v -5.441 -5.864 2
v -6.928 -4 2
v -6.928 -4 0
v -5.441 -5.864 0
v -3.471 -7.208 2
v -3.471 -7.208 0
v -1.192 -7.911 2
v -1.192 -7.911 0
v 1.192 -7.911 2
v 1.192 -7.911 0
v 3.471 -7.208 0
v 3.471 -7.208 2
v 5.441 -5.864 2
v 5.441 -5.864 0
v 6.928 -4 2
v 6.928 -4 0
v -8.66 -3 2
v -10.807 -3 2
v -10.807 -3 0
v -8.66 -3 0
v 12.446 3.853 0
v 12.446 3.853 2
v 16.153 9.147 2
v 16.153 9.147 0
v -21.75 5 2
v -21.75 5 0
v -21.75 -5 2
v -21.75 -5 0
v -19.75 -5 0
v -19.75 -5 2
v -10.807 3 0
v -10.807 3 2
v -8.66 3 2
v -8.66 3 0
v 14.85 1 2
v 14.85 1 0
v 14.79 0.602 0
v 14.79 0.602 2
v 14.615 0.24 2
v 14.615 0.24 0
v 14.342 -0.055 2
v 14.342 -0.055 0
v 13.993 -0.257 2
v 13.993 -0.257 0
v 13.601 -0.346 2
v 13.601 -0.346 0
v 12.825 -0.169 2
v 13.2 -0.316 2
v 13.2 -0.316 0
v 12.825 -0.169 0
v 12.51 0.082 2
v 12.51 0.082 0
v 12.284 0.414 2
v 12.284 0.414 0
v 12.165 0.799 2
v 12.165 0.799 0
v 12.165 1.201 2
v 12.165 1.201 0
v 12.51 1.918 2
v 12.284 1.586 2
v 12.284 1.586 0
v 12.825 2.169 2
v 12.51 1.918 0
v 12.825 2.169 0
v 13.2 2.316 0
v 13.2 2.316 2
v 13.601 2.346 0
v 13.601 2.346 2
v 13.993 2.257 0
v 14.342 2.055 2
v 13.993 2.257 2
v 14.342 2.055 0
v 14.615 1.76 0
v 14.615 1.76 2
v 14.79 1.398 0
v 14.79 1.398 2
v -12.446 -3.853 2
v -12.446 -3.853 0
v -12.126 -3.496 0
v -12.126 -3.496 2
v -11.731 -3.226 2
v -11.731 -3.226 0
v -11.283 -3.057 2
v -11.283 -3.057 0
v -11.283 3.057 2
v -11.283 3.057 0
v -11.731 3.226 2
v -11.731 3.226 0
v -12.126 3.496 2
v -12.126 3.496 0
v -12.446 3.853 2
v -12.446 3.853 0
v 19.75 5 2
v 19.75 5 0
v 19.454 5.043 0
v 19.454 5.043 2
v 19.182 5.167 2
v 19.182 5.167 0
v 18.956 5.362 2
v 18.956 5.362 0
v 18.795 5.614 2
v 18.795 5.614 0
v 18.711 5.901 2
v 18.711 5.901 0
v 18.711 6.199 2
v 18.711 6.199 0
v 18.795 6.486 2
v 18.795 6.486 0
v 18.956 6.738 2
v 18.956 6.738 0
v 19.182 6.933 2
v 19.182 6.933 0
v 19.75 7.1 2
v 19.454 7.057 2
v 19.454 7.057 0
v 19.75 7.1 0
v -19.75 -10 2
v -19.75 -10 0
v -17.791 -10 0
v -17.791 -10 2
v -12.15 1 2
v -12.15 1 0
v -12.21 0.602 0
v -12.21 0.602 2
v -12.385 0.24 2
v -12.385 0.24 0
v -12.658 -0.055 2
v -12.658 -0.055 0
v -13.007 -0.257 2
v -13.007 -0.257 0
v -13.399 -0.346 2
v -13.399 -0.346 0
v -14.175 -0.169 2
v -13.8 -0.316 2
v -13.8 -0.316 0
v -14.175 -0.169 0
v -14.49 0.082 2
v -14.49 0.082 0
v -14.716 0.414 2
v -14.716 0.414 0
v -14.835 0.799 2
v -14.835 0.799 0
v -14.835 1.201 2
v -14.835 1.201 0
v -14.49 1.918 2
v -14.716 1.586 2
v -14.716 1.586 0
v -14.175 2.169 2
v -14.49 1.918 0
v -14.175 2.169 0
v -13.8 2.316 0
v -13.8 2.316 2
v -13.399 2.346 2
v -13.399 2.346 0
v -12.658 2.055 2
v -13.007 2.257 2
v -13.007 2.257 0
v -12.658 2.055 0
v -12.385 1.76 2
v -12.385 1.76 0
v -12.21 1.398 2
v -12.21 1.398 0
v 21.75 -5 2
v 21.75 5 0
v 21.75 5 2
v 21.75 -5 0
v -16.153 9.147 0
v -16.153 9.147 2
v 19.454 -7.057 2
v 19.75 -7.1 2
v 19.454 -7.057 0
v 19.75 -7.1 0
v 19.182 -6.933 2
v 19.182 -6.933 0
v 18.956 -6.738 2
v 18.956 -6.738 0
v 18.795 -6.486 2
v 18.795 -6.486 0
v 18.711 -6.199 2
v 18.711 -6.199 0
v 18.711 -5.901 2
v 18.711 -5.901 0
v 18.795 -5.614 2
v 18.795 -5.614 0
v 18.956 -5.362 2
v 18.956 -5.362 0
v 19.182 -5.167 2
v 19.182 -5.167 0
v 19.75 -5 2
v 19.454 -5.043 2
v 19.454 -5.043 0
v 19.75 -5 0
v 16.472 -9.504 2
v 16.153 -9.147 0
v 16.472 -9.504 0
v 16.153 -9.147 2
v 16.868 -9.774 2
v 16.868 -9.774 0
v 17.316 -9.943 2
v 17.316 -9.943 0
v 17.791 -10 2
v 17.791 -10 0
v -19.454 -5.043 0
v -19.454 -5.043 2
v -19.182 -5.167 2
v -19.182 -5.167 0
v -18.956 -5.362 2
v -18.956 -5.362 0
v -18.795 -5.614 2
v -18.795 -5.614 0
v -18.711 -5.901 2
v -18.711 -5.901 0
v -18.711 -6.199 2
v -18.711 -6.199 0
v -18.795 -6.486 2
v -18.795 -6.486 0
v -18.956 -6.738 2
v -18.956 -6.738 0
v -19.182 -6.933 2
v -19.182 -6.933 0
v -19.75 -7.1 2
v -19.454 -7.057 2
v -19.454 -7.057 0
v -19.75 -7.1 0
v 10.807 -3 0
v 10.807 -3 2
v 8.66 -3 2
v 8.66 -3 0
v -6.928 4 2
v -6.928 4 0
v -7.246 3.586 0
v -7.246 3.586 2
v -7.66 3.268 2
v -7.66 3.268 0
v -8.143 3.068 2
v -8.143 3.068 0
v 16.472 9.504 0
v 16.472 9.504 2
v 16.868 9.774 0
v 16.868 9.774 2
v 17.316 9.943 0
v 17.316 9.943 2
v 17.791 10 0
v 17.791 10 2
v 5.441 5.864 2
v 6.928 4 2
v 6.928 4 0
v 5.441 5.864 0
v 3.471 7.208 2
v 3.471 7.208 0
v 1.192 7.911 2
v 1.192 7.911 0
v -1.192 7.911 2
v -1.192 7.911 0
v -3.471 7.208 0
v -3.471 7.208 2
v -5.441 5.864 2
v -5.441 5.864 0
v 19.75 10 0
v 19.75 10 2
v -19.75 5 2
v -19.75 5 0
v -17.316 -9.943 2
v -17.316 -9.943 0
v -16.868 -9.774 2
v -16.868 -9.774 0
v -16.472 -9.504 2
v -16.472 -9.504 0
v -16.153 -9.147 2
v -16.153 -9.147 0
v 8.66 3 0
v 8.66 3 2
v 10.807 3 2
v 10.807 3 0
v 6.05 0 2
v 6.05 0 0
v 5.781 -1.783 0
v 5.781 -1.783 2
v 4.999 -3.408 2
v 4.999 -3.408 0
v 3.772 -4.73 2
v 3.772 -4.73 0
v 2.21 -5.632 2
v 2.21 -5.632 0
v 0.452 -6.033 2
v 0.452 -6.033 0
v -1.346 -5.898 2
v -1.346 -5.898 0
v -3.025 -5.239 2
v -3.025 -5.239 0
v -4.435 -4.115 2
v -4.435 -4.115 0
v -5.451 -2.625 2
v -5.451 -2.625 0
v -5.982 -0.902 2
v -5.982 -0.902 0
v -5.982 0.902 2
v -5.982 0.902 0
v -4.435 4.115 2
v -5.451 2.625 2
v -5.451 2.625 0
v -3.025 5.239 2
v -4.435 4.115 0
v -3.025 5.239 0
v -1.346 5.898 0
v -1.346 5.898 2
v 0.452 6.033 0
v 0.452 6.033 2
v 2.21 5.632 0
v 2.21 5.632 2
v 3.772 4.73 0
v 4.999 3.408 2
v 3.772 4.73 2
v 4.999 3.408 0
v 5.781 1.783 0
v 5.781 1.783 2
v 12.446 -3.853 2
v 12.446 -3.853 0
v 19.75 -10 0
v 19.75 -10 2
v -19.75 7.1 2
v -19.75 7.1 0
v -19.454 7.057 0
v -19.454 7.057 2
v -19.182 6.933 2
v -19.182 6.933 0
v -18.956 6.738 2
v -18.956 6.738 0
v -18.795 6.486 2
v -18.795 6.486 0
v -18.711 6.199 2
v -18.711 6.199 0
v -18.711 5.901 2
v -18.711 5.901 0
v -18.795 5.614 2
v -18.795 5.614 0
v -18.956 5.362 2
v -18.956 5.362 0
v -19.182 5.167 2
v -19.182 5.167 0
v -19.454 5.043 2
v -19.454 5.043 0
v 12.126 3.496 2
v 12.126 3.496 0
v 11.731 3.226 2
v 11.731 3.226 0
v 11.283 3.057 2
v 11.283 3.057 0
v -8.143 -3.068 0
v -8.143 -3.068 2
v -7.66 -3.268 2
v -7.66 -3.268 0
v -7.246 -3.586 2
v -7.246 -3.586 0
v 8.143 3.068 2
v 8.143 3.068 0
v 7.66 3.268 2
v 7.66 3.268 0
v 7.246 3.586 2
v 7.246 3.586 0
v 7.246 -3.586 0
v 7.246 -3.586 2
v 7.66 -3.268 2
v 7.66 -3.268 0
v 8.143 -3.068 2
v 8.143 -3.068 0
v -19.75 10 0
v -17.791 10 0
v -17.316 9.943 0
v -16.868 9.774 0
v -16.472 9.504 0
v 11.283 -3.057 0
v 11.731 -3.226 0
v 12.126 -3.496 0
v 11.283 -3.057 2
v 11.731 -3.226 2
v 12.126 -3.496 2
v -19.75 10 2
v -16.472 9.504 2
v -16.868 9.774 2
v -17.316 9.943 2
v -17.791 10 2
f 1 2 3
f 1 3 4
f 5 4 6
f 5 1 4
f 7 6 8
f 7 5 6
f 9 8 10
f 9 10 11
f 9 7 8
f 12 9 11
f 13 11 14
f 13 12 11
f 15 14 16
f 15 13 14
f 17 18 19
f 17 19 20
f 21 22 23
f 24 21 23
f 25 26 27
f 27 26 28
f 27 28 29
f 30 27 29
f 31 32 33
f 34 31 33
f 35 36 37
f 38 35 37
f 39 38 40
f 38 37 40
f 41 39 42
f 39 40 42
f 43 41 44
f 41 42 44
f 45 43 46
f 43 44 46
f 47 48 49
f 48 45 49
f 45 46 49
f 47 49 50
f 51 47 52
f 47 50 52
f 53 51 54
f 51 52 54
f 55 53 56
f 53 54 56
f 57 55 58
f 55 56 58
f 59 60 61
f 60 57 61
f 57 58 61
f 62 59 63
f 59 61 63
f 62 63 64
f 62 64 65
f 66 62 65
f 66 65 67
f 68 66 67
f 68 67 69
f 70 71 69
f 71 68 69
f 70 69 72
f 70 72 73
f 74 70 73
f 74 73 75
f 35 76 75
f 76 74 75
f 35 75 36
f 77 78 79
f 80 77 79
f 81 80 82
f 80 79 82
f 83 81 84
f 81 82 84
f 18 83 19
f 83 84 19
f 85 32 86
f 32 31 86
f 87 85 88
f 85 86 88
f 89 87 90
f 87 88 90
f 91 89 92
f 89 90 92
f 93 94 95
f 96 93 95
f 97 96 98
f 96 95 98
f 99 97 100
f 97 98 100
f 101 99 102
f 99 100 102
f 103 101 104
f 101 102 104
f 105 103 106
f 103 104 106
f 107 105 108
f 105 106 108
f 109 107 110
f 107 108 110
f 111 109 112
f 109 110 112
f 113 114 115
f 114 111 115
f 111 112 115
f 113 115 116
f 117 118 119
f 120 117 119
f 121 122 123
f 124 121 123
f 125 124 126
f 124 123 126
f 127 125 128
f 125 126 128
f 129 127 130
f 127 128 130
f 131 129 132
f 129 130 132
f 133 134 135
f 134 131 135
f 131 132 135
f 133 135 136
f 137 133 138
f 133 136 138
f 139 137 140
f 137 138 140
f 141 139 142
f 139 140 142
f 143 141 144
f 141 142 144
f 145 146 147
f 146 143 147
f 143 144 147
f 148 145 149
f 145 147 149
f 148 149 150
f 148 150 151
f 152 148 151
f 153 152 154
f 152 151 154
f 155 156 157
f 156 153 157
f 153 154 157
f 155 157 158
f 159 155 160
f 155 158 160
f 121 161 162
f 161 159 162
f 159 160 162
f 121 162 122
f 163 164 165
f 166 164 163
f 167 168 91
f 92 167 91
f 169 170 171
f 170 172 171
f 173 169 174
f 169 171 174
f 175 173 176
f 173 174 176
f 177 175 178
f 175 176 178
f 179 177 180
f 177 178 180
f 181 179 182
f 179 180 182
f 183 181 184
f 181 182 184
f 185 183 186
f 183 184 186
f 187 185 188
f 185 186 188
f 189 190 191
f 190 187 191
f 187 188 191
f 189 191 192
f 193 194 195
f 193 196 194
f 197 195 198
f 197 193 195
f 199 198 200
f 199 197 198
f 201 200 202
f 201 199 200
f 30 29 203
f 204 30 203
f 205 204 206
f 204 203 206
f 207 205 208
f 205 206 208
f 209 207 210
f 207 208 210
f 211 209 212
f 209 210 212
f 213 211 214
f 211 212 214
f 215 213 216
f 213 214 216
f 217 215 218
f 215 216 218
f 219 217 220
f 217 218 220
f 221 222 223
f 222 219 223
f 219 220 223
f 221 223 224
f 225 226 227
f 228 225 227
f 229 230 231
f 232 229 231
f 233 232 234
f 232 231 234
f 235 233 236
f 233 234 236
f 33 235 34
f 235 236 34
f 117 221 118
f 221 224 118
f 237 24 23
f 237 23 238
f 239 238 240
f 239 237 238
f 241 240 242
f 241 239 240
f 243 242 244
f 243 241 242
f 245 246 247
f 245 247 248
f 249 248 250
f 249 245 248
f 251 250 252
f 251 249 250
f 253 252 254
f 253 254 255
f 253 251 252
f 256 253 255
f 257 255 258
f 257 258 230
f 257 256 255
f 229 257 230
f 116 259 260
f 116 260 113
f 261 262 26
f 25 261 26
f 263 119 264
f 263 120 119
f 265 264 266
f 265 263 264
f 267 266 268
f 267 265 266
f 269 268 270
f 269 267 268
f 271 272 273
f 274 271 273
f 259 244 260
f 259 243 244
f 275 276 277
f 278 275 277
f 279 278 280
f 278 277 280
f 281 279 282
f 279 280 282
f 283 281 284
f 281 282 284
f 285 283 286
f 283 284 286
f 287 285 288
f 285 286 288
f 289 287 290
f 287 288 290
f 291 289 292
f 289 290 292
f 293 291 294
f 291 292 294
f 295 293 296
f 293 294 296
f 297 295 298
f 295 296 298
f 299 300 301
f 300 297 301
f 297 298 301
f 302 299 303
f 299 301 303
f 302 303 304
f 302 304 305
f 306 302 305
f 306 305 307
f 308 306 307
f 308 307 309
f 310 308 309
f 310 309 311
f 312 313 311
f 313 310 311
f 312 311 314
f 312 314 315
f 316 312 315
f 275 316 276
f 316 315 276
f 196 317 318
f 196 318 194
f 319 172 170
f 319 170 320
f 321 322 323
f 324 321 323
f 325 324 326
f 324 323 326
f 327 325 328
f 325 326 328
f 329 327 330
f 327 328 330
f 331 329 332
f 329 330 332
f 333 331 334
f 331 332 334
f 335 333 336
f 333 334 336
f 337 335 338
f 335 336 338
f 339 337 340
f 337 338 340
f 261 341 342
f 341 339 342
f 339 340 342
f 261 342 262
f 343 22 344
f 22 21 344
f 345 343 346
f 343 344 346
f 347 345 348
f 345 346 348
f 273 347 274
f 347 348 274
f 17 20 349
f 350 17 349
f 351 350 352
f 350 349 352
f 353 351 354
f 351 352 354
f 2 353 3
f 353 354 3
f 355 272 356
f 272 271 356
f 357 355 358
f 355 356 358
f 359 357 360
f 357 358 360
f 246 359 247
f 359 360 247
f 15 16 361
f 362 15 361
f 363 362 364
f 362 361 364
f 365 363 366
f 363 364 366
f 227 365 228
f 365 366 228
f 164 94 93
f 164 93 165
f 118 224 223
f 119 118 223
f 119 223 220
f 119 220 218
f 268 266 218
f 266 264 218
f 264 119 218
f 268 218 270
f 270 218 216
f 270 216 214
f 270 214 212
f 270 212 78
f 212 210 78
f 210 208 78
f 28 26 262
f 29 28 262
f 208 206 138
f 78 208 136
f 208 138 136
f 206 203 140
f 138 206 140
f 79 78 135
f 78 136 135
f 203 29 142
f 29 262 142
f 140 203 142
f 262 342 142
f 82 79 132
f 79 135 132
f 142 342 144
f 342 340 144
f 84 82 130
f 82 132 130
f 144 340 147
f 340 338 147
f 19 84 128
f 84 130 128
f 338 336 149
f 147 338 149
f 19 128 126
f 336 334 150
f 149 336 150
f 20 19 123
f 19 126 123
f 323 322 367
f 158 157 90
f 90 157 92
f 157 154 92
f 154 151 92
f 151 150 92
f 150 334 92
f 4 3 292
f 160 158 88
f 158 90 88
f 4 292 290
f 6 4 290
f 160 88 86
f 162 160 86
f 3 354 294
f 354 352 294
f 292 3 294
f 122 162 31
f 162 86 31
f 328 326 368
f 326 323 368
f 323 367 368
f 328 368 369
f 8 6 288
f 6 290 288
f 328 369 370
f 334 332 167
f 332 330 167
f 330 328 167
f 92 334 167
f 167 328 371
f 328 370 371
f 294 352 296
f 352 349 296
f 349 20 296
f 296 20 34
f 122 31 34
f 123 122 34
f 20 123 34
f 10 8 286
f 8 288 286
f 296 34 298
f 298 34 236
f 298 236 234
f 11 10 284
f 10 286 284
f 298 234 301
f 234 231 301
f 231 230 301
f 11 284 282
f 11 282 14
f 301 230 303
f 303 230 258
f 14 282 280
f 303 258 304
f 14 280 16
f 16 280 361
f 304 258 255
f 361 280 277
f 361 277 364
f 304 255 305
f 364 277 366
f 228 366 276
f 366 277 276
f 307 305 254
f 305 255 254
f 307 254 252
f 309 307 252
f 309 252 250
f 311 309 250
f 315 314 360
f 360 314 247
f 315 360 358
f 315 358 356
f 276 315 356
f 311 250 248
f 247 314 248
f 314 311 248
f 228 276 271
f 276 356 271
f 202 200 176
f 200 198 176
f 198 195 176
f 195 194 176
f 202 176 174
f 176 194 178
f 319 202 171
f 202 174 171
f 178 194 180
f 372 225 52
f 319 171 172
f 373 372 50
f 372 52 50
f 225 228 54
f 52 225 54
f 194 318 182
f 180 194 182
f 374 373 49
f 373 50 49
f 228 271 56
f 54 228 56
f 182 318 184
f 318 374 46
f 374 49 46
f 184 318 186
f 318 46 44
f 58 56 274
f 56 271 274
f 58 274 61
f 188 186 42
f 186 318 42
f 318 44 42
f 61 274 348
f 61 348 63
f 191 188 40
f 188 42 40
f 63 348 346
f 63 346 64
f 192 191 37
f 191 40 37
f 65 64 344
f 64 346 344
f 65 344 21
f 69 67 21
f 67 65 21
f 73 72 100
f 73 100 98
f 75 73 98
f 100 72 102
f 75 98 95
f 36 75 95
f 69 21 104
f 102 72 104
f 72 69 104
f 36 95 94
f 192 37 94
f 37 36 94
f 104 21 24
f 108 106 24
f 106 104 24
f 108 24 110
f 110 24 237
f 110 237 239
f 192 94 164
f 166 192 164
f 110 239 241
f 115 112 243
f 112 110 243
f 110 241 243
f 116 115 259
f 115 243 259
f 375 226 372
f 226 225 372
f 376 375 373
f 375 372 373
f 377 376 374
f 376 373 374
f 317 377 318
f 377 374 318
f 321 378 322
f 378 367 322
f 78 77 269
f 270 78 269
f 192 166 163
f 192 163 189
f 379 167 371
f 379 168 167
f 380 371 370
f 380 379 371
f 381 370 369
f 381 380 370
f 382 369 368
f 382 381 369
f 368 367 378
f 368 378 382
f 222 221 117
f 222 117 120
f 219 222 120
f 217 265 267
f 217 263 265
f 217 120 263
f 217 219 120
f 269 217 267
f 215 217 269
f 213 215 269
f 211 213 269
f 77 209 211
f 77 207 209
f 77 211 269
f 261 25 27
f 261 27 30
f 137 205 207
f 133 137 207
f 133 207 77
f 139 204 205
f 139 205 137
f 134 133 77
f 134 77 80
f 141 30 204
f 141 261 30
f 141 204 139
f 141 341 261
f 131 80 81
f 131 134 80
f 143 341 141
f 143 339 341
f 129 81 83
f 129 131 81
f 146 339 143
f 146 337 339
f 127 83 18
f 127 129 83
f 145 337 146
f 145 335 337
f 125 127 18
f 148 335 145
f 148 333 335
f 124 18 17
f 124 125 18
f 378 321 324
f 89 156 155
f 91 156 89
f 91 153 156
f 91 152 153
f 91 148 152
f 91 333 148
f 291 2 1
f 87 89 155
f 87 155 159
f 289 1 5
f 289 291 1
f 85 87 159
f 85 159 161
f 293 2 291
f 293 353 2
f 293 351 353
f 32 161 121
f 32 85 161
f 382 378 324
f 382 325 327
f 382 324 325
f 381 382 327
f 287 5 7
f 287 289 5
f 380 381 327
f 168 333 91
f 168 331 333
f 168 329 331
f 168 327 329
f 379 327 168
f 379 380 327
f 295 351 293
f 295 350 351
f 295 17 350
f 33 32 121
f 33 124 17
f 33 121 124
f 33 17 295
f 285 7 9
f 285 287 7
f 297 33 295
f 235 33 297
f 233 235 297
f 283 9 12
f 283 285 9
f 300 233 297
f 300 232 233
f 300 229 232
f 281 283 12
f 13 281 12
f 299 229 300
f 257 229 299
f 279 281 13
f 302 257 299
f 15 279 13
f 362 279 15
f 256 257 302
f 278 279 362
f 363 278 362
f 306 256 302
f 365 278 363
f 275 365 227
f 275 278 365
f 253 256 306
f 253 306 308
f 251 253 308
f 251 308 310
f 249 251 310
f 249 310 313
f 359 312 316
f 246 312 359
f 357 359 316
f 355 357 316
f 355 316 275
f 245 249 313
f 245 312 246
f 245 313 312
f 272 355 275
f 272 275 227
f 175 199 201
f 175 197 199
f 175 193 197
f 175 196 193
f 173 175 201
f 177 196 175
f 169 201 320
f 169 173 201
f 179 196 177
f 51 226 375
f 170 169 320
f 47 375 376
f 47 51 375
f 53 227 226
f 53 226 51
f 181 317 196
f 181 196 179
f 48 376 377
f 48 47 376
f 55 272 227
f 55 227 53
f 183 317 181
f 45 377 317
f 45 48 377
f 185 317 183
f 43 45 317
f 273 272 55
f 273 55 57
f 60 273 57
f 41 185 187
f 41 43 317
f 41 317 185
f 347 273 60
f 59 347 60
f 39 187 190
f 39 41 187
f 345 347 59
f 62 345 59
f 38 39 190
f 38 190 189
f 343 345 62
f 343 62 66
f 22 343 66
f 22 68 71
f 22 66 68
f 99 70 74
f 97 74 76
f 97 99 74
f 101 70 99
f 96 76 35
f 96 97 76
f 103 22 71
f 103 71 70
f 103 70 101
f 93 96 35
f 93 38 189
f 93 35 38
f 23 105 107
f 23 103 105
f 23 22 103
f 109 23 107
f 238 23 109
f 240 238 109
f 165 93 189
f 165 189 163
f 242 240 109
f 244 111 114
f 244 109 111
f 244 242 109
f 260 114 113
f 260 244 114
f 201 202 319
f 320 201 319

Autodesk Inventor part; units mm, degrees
ref_plane "YZ Plane" through (0, 0, 0) normal (1, 0, 0) x (0, 1, 0)
ref_plane "XZ Plane" through (0, 0, 0) normal (0, 1, 0) x (-1, 0, 0)
ref_plane "XY Plane" through (0, 0, 0) normal (0, 0, 1) x (1, 0, 0)
sketch "スケッチ1" plane through (0, 0, 0) normal (0, 0, 1) x (1, 0, 0)
  circle A0 centre (0, 0) radius 10.5 construction
  circle A1 centre (-13.5, 1) radius 1.35
  line L0 (-13.5, 28) -> (13.5, 28) construction
  line L1 (13.5, 28) -> (13.5, 1) construction
  line L2 (13.5, 1) -> (-13.5, 1) construction
  line L3 (-13.5, 1) -> (-13.5, 28) construction
  circle A2 centre (-13.5, 28) radius 1.35
  circle A3 centre (13.5, 1) radius 1.35
  circle A4 centre (13.5, 28) radius 1.35
  line L4 (-19.75, 10) -> (-19.75, 7.1)
  line L5 (-19.75, 10) -> (19.75, 10)
  line L6 (19.75, 10) -> (19.75, 7.1)
  line L7 (-19.75, -7.1) -> (-19.75, -10)
  line L8 (-19.75, -10) -> (19.75, -10)
  line L9 (19.75, -7.1) -> (19.75, -10)
  line L10 (-19.75, 5) -> (-21.75, 5)
  line L11 (-21.75, 5) -> (-21.75, -5)
  line L12 (-21.75, -5) -> (-19.75, -5)
  arc A5 (-19.75, 5) -> (-19.75, 7.1) centre (-19.75, 6.05) ccw
  arc A6 (-19.75, -7.1) -> (-19.75, -5) centre (-19.75, -6.05) ccw
  line L13 (19.75, 5) -> (21.75, 5)
  line L14 (21.75, 5) -> (21.75, -5)
  line L15 (21.75, -5) -> (19.75, -5)
  arc A7 (19.75, 7.1) -> (19.75, 5) centre (19.75, 6.05) ccw
  line L16 (0, 28) -> (0, 0) construction
  arc A8 (19.75, -5) -> (19.75, -7.1) centre (19.75, -6.05) ccw
  line L17 (-21.75, 0) -> (21.75, 0) construction
  circle A9 centre (0, 0) radius 6.05
  point P0 (0, 10)
  dimension "d8" = 21
  dimension "d10" = 27
  dimension "d12" = 1
  dimension "d13" = 2.7
  dimension "d38" = 27
  dimension "d44" = 27
  dimension "d47" = 1.05
  dimension "d48" = 39.5
  dimension "d49" = 2
  dimension "d50" = 10
  dimension "d51" = 5
  dimension "d52" = 12.1
extrude "押し出し1" add sketch "スケッチ1" along normal blind 2 contours L5 L6 A7 L13 L14 L15 A8 L9 L8 L7 A6 L12 L11 L10 A5 L4
sketch "スケッチ2" plane through (0, 0, 2) normal (0, 0, 1) x (1, 0, 0)
  circle A0 centre (0, 0) radius 6.05 projected
  circle A1 centre (-13.5, 1) radius 1.35 projected
  line L0 (-19.75, -10) -> (19.75, -10) projected
  line L1 (19.75, 10) -> (-19.75, 10) projected
  line L2 (-11.8485, 3) -> (-7.4162, 3)
  arc A2 (7.4162, 3) -> (-7.4162, 3) centre (0, 0) ccw
  line L3 (7.4162, 3) -> (11.8485, 3)
  line L4 (-18.4641, 12.448) -> (18.4641, 12.448)
  line L5 (-18.4641, 12.448) -> (-11.8485, 3)
  line L6 (11.8485, 3) -> (18.4641, 12.448)
  line L7 (-11.8485, -3) -> (-7.4162, -3)
  line L8 (-11.8485, -3) -> (-24.333, -20.8295)
  line L9 (-24.333, -20.8295) -> (24.333, -20.8295)
  line L10 (11.8485, -3) -> (7.4162, -3)
  line L11 (11.8485, -3) -> (24.333, -20.8295)
  arc A3 (-7.4162, -3) -> (7.4162, -3) centre (0, 0) ccw
  line L12 (-21.75, 5) -> (-21.75, -5) projected
  line L13 (-16.75, 10) -> (-19.75, 10) construction
  line L14 (0, 0) -> (-21.75, 0) construction
  line L15 (-19.75, -10) -> (-16.75, -10) construction
  line L16 (-19.75, -10) -> (19.75, -10) construction
  line L17 (0, 0) -> (0, 10) construction
  line L18 (19.75, 10) -> (16.75, 10) construction
  line L19 (19.75, -10) -> (16.75, -10) construction
  circle A4 centre (-13.5, 1) radius 2.5 construction
  dimension "d57" = 8
  dimension "d58" = 3
  dimension "d60" = 6
  dimension "d64" = 3
  dimension "d65" = 5
extrude "押し出し2" cut sketch "スケッチ2" against normal blind 10 contours L8 L7 A3 L10 L11 L0 | L0 L11 L9 L8 | L6 L3 A2 L2 L5 L1 | L1 L5 L4 L6
fillet "フィレット1" radius 2 12 edges at (-11.8485, 3, 1) (-7.4162, 3, 1) (7.4162, 3, 1) (11.8485, -3, 1) (7.4162, -3, 1) (-7.4162, -3, 1) (-11.8485, -3, 1) (-16.75, -10, 1) (-16.75, 10, 1) (16.75, 10, 1) (16.75, -10, 1) (11.8485, 3, 1)
equation "\"d38\" = d10"
equation "\"d44\" = d10"
equation "\"d50\" = d11"
equation "\"d51\" = d28"
equation "\"d60\" = 2 * d58"
equation "\"d11\" = 10"
equation "\"d28\" = 5"
properties part number "付け根_サブフレーム_1_2" material "アルミニウム 2014-T4"
